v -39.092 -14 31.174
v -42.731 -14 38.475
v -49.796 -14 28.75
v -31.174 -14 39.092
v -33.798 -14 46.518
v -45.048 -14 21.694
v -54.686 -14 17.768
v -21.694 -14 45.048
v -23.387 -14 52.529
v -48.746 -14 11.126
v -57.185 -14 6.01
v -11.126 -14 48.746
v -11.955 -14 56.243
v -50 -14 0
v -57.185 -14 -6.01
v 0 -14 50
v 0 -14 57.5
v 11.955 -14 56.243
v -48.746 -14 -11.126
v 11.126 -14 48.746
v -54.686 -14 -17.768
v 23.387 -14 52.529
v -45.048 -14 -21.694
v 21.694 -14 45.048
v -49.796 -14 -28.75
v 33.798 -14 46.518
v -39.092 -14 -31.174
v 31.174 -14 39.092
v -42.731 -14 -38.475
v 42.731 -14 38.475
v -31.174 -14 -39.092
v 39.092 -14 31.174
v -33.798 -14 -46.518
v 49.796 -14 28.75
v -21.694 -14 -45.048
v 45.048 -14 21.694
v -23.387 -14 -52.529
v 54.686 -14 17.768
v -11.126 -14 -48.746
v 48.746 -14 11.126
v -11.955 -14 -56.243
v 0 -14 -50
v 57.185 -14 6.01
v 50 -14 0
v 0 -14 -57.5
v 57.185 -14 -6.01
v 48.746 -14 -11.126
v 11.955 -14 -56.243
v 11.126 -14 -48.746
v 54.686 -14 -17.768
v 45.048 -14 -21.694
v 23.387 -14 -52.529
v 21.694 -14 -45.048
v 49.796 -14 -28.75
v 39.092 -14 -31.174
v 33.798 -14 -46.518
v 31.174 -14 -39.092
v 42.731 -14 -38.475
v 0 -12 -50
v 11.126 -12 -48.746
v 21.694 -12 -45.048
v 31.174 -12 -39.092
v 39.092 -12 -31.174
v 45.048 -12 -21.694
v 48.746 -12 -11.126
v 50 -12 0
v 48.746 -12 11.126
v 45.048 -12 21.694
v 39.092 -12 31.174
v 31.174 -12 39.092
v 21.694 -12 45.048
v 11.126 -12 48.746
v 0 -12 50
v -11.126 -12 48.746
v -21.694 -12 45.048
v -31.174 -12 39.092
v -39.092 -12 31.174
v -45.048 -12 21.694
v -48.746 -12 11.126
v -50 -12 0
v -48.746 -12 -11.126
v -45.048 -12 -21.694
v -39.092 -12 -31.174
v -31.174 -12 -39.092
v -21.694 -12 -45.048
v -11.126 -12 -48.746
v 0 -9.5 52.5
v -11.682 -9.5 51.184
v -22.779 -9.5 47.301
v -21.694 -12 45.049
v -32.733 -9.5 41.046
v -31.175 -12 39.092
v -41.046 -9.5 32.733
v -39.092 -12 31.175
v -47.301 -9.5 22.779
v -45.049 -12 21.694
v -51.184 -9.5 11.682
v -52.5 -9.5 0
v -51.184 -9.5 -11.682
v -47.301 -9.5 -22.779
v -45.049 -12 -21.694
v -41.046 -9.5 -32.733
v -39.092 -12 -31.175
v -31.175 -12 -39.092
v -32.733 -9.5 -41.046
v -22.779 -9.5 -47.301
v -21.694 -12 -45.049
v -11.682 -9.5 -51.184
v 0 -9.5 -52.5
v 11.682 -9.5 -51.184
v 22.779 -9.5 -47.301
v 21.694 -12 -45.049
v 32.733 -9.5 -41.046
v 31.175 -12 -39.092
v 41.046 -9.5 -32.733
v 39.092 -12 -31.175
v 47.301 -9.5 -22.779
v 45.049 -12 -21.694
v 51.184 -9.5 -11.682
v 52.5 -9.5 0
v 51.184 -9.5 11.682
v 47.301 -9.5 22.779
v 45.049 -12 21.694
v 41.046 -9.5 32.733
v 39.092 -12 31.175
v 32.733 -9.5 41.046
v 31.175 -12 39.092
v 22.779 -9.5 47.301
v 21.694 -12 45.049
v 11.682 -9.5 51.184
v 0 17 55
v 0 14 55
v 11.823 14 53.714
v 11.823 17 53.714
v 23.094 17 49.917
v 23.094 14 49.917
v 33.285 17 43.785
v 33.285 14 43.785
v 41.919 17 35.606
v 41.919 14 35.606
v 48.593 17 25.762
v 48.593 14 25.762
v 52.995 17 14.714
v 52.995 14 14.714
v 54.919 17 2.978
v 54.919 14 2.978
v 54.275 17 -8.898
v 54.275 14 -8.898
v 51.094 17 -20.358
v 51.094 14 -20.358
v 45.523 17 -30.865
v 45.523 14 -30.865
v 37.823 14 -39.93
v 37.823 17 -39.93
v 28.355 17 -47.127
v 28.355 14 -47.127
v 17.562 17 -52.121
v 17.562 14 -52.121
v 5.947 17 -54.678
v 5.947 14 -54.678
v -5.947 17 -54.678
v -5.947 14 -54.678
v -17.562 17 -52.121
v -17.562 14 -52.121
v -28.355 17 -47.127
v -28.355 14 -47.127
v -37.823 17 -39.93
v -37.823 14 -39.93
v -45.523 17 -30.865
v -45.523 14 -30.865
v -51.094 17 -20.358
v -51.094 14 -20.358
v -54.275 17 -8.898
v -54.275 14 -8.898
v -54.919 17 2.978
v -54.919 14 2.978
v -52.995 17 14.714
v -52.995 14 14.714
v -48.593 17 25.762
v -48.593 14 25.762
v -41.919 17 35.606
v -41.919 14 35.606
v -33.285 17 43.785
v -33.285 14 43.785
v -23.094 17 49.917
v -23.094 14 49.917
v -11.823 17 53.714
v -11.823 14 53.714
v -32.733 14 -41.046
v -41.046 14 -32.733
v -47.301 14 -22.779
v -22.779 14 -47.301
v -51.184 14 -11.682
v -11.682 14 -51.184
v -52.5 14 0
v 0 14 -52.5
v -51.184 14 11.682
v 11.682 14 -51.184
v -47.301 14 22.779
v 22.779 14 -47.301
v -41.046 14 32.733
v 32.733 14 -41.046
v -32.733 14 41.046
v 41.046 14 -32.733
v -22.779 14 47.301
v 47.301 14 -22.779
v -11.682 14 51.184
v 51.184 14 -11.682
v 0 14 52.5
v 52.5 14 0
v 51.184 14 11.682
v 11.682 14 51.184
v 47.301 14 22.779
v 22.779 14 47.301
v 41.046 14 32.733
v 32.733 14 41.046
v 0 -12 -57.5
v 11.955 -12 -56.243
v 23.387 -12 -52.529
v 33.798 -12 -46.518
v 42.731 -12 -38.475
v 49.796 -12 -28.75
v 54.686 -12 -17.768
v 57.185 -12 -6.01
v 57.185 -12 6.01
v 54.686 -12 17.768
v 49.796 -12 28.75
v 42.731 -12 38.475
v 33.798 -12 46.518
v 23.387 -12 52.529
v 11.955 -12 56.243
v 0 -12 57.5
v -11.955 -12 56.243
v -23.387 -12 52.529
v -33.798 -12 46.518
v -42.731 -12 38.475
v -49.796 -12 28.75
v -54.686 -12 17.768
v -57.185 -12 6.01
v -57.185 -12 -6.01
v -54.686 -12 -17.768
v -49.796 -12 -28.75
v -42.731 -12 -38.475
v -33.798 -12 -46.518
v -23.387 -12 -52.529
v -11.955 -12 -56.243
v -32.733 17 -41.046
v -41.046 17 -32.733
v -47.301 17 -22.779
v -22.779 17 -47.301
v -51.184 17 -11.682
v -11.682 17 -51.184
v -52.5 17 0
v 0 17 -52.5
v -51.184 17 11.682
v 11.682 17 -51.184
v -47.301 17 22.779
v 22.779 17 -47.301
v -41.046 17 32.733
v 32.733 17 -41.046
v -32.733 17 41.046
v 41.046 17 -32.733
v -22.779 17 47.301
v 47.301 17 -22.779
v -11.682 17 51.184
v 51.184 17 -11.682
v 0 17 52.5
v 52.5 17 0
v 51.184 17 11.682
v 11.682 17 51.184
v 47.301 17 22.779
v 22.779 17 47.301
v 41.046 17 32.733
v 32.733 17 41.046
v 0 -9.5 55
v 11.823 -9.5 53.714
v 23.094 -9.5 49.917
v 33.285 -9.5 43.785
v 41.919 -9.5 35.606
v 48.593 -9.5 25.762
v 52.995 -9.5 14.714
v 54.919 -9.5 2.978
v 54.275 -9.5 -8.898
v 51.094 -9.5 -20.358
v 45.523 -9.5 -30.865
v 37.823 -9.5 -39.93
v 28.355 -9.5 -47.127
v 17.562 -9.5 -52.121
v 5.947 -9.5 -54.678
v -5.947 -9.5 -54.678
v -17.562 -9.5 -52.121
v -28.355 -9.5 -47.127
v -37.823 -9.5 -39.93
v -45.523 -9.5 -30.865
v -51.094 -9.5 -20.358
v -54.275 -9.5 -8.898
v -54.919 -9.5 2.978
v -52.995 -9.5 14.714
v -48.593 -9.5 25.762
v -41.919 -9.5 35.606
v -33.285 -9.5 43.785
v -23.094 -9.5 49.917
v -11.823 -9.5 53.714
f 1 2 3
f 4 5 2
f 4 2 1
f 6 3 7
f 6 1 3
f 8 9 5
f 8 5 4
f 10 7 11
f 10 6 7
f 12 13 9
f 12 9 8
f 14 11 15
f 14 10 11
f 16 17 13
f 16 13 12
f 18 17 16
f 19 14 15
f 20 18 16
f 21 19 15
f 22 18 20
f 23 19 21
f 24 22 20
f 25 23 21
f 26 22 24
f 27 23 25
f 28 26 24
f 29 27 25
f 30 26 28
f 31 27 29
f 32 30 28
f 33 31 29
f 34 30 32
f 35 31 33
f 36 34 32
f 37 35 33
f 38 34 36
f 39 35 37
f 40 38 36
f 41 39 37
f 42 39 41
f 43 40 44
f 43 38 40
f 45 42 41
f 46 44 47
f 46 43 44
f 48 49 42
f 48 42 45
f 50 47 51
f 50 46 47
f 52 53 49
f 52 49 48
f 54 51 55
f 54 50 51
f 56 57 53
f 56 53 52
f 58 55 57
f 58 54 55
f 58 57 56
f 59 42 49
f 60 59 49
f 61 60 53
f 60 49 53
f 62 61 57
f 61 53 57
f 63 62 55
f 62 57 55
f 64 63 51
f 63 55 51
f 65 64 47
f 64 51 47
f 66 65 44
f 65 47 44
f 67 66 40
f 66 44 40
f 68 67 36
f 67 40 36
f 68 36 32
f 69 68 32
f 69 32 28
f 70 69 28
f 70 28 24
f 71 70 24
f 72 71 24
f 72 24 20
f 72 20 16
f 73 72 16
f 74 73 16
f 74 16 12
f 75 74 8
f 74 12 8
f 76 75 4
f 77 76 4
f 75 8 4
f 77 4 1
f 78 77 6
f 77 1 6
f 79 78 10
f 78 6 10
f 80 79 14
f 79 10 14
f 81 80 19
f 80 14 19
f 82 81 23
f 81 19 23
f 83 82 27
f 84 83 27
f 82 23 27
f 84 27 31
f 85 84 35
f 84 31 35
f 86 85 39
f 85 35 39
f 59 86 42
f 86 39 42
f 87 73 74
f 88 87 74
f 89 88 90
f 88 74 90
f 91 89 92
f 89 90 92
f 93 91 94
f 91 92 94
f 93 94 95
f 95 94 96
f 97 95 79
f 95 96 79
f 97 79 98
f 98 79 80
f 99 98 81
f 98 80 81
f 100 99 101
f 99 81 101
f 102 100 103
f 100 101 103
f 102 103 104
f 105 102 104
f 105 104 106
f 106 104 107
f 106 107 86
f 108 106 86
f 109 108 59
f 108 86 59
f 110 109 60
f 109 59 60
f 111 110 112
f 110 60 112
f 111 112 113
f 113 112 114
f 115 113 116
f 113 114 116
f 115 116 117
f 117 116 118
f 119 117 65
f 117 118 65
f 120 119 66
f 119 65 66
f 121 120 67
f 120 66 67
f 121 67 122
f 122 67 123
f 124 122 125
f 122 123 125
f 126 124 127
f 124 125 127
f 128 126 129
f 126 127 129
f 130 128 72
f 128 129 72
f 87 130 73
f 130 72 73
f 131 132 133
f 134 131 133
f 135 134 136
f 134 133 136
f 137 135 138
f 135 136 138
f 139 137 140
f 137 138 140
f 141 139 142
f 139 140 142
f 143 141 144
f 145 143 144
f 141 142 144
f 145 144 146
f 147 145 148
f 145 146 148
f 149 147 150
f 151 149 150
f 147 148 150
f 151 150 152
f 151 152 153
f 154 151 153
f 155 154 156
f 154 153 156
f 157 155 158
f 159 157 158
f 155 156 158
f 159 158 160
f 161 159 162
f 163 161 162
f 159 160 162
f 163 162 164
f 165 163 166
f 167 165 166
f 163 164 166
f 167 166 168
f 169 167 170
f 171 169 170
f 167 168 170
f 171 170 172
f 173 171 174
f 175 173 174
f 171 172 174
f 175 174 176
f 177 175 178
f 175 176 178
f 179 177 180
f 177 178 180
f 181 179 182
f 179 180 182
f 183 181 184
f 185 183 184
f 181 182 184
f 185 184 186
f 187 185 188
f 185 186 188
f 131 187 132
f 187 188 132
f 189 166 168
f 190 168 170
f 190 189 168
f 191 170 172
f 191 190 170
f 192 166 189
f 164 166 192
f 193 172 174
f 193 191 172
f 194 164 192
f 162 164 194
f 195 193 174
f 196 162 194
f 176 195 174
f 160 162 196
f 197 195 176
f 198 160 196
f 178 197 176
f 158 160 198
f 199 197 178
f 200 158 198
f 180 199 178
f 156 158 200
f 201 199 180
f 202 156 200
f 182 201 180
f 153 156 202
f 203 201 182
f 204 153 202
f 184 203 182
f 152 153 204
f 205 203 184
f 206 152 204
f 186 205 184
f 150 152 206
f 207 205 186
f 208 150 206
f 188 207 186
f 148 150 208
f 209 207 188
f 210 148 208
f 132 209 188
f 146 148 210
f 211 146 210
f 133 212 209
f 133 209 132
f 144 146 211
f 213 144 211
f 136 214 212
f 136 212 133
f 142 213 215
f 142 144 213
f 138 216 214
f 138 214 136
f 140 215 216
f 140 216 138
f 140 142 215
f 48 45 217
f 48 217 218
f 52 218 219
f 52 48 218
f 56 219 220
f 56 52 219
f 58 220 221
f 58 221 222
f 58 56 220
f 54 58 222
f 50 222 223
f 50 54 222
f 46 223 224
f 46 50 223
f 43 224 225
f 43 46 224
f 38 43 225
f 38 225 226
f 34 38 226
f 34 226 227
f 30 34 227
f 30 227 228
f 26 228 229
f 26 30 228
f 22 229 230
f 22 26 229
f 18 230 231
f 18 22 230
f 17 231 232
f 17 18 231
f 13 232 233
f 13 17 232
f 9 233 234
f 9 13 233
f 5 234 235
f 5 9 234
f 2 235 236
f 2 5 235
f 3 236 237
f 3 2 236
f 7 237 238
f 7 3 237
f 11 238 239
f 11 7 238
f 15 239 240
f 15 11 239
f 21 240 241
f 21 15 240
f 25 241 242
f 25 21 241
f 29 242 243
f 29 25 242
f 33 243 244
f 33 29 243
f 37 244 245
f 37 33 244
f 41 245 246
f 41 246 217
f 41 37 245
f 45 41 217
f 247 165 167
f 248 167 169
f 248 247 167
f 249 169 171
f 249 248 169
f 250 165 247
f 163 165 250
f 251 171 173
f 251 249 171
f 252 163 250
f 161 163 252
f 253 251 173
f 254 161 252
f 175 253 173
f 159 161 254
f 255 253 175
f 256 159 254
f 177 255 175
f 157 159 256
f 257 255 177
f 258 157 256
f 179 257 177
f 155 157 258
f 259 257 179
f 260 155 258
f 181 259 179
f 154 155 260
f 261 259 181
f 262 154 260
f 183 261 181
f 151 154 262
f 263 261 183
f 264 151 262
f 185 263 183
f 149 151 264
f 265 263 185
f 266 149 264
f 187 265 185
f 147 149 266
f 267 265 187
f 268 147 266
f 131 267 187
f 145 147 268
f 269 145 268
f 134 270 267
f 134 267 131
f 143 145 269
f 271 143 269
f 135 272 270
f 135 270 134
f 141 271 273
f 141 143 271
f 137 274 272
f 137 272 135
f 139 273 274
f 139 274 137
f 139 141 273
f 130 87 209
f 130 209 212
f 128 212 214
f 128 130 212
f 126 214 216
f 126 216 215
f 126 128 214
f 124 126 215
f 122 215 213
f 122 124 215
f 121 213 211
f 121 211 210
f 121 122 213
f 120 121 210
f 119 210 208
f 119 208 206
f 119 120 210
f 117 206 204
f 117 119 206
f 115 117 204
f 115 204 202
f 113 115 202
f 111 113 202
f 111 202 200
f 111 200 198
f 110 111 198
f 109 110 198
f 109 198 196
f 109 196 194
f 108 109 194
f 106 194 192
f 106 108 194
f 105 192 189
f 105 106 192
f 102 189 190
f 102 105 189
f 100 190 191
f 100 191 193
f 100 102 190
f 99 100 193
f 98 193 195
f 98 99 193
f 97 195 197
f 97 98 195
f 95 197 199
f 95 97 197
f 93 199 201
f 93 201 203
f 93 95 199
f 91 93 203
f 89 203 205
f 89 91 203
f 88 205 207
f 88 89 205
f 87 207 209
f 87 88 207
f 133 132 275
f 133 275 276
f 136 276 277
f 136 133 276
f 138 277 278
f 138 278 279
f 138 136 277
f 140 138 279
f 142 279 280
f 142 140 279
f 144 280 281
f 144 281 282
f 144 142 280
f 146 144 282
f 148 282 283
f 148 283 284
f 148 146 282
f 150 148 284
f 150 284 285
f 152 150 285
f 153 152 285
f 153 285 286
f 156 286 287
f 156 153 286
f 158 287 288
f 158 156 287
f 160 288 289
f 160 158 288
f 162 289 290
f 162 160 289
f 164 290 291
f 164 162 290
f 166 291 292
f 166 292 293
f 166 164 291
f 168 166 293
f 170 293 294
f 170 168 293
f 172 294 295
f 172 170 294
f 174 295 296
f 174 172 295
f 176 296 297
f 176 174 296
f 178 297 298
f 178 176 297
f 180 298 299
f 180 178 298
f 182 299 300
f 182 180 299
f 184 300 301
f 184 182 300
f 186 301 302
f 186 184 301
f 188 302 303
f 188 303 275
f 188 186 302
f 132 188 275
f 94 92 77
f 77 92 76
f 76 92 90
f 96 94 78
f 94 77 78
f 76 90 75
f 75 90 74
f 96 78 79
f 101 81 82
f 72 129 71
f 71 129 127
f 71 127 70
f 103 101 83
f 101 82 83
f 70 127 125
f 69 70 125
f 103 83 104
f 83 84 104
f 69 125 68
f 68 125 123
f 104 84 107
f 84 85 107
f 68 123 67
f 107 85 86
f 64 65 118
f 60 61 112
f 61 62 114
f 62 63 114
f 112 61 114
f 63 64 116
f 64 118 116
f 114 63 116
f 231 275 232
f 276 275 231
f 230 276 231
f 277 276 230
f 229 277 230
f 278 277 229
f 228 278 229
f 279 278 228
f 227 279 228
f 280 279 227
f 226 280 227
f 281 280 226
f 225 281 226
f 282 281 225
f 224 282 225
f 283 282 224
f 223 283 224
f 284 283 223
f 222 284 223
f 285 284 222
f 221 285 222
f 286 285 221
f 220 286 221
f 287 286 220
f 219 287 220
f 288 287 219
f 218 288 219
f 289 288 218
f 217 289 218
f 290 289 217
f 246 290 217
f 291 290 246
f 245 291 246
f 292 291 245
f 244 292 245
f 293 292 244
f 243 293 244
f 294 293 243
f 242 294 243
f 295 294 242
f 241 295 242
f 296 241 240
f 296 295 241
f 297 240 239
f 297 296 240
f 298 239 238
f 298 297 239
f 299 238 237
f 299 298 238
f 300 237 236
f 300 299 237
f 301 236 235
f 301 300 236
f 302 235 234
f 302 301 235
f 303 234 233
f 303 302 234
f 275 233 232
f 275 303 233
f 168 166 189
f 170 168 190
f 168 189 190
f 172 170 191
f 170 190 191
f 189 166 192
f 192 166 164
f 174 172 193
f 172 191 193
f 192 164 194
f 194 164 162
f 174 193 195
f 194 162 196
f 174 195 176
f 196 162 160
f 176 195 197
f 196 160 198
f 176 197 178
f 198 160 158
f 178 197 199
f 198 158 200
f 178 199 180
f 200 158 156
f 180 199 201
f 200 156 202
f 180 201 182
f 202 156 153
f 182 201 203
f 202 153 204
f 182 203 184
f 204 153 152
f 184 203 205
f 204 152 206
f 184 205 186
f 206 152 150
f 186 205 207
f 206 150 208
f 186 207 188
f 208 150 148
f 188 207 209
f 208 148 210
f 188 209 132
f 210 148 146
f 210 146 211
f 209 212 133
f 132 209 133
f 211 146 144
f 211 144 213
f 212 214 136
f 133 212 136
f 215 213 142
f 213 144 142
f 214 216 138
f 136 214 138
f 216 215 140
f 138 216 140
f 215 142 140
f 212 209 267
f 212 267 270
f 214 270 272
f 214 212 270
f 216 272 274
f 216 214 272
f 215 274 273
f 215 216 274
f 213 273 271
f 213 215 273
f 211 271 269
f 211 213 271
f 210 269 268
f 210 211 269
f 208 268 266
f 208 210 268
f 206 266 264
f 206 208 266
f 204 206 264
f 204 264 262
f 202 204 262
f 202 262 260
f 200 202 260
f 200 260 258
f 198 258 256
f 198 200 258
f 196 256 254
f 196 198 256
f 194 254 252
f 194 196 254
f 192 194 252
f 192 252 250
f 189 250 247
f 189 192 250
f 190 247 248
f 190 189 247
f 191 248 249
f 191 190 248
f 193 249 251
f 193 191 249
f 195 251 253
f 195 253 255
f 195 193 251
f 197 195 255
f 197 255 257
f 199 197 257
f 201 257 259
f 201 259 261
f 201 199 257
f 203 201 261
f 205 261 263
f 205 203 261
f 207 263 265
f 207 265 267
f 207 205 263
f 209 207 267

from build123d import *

# Parameters (mm, degrees)
SKETCH1_R           = 55
SKETCH1_R_2         = 52.5
BOSS_EXTRUDE1_DEPTH = 14
SKETCH2_R           = 57.5
SKETCH2_R_2         = 50
BOSS_EXTRUDE2_DEPTH = 2
CHAMFER1_SIZE       = 2.5
SKETCH3_R           = 55
SKETCH3_R_2         = 52.5
BOSS_EXTRUDE3_DEPTH = 3


with BuildPart() as part:
    # Sketch1 → Boss-Extrude1 (new, symmetric)
    with BuildSketch(Plane(origin=(0, 0, 0), x_dir=(1, 0, 0), z_dir=(0, 1, 0))):
        with Locations(Location((0, 0, 0), (0, 0, 270))):
            Circle(SKETCH1_R)
        with Locations(Location((0, 0, 0), (0, 0, 270))):
            Circle(SKETCH1_R_2, mode=Mode.SUBTRACT)
    extrude(amount=BOSS_EXTRUDE1_DEPTH, both=True)

    # Sketch2 → Boss-Extrude2 (add)
    with BuildSketch(Plane.XZ.offset(14)):
        with Locations(Location((0, 0, 0), (0, 0, 270))):
            Circle(SKETCH2_R)
        with Locations(Location((0, 0, 0), (0, 0, 270))):
            Circle(SKETCH2_R_2, mode=Mode.SUBTRACT)
    extrude(amount=-BOSS_EXTRUDE2_DEPTH)

    # Chamfer1
    chamfer1_edges = [part.edges().sort_by_distance(p)[0] for p in [
        (0, -12, -55),
        (0, -12, -52.5),
    ]]
    chamfer(chamfer1_edges, length=CHAMFER1_SIZE - 0.0001)  # a hair under: the kernel refuses the full size


with BuildPart() as body_2:
    # Sketch3 → Boss-Extrude3 (new body)
    with BuildSketch(Plane(origin=(0, 14, 0), x_dir=(1, 0, 0), z_dir=(0, 1, 0))):
        with Locations(Location((0, 0, 0), (0, 0, 270))):
            Circle(SKETCH3_R)
        with Locations(Location((0, 0, 0), (0, 0, 270))):
            Circle(SKETCH3_R_2, mode=Mode.SUBTRACT)
    extrude(amount=BOSS_EXTRUDE3_DEPTH)


solid = Compound([part.part, body_2.part])
